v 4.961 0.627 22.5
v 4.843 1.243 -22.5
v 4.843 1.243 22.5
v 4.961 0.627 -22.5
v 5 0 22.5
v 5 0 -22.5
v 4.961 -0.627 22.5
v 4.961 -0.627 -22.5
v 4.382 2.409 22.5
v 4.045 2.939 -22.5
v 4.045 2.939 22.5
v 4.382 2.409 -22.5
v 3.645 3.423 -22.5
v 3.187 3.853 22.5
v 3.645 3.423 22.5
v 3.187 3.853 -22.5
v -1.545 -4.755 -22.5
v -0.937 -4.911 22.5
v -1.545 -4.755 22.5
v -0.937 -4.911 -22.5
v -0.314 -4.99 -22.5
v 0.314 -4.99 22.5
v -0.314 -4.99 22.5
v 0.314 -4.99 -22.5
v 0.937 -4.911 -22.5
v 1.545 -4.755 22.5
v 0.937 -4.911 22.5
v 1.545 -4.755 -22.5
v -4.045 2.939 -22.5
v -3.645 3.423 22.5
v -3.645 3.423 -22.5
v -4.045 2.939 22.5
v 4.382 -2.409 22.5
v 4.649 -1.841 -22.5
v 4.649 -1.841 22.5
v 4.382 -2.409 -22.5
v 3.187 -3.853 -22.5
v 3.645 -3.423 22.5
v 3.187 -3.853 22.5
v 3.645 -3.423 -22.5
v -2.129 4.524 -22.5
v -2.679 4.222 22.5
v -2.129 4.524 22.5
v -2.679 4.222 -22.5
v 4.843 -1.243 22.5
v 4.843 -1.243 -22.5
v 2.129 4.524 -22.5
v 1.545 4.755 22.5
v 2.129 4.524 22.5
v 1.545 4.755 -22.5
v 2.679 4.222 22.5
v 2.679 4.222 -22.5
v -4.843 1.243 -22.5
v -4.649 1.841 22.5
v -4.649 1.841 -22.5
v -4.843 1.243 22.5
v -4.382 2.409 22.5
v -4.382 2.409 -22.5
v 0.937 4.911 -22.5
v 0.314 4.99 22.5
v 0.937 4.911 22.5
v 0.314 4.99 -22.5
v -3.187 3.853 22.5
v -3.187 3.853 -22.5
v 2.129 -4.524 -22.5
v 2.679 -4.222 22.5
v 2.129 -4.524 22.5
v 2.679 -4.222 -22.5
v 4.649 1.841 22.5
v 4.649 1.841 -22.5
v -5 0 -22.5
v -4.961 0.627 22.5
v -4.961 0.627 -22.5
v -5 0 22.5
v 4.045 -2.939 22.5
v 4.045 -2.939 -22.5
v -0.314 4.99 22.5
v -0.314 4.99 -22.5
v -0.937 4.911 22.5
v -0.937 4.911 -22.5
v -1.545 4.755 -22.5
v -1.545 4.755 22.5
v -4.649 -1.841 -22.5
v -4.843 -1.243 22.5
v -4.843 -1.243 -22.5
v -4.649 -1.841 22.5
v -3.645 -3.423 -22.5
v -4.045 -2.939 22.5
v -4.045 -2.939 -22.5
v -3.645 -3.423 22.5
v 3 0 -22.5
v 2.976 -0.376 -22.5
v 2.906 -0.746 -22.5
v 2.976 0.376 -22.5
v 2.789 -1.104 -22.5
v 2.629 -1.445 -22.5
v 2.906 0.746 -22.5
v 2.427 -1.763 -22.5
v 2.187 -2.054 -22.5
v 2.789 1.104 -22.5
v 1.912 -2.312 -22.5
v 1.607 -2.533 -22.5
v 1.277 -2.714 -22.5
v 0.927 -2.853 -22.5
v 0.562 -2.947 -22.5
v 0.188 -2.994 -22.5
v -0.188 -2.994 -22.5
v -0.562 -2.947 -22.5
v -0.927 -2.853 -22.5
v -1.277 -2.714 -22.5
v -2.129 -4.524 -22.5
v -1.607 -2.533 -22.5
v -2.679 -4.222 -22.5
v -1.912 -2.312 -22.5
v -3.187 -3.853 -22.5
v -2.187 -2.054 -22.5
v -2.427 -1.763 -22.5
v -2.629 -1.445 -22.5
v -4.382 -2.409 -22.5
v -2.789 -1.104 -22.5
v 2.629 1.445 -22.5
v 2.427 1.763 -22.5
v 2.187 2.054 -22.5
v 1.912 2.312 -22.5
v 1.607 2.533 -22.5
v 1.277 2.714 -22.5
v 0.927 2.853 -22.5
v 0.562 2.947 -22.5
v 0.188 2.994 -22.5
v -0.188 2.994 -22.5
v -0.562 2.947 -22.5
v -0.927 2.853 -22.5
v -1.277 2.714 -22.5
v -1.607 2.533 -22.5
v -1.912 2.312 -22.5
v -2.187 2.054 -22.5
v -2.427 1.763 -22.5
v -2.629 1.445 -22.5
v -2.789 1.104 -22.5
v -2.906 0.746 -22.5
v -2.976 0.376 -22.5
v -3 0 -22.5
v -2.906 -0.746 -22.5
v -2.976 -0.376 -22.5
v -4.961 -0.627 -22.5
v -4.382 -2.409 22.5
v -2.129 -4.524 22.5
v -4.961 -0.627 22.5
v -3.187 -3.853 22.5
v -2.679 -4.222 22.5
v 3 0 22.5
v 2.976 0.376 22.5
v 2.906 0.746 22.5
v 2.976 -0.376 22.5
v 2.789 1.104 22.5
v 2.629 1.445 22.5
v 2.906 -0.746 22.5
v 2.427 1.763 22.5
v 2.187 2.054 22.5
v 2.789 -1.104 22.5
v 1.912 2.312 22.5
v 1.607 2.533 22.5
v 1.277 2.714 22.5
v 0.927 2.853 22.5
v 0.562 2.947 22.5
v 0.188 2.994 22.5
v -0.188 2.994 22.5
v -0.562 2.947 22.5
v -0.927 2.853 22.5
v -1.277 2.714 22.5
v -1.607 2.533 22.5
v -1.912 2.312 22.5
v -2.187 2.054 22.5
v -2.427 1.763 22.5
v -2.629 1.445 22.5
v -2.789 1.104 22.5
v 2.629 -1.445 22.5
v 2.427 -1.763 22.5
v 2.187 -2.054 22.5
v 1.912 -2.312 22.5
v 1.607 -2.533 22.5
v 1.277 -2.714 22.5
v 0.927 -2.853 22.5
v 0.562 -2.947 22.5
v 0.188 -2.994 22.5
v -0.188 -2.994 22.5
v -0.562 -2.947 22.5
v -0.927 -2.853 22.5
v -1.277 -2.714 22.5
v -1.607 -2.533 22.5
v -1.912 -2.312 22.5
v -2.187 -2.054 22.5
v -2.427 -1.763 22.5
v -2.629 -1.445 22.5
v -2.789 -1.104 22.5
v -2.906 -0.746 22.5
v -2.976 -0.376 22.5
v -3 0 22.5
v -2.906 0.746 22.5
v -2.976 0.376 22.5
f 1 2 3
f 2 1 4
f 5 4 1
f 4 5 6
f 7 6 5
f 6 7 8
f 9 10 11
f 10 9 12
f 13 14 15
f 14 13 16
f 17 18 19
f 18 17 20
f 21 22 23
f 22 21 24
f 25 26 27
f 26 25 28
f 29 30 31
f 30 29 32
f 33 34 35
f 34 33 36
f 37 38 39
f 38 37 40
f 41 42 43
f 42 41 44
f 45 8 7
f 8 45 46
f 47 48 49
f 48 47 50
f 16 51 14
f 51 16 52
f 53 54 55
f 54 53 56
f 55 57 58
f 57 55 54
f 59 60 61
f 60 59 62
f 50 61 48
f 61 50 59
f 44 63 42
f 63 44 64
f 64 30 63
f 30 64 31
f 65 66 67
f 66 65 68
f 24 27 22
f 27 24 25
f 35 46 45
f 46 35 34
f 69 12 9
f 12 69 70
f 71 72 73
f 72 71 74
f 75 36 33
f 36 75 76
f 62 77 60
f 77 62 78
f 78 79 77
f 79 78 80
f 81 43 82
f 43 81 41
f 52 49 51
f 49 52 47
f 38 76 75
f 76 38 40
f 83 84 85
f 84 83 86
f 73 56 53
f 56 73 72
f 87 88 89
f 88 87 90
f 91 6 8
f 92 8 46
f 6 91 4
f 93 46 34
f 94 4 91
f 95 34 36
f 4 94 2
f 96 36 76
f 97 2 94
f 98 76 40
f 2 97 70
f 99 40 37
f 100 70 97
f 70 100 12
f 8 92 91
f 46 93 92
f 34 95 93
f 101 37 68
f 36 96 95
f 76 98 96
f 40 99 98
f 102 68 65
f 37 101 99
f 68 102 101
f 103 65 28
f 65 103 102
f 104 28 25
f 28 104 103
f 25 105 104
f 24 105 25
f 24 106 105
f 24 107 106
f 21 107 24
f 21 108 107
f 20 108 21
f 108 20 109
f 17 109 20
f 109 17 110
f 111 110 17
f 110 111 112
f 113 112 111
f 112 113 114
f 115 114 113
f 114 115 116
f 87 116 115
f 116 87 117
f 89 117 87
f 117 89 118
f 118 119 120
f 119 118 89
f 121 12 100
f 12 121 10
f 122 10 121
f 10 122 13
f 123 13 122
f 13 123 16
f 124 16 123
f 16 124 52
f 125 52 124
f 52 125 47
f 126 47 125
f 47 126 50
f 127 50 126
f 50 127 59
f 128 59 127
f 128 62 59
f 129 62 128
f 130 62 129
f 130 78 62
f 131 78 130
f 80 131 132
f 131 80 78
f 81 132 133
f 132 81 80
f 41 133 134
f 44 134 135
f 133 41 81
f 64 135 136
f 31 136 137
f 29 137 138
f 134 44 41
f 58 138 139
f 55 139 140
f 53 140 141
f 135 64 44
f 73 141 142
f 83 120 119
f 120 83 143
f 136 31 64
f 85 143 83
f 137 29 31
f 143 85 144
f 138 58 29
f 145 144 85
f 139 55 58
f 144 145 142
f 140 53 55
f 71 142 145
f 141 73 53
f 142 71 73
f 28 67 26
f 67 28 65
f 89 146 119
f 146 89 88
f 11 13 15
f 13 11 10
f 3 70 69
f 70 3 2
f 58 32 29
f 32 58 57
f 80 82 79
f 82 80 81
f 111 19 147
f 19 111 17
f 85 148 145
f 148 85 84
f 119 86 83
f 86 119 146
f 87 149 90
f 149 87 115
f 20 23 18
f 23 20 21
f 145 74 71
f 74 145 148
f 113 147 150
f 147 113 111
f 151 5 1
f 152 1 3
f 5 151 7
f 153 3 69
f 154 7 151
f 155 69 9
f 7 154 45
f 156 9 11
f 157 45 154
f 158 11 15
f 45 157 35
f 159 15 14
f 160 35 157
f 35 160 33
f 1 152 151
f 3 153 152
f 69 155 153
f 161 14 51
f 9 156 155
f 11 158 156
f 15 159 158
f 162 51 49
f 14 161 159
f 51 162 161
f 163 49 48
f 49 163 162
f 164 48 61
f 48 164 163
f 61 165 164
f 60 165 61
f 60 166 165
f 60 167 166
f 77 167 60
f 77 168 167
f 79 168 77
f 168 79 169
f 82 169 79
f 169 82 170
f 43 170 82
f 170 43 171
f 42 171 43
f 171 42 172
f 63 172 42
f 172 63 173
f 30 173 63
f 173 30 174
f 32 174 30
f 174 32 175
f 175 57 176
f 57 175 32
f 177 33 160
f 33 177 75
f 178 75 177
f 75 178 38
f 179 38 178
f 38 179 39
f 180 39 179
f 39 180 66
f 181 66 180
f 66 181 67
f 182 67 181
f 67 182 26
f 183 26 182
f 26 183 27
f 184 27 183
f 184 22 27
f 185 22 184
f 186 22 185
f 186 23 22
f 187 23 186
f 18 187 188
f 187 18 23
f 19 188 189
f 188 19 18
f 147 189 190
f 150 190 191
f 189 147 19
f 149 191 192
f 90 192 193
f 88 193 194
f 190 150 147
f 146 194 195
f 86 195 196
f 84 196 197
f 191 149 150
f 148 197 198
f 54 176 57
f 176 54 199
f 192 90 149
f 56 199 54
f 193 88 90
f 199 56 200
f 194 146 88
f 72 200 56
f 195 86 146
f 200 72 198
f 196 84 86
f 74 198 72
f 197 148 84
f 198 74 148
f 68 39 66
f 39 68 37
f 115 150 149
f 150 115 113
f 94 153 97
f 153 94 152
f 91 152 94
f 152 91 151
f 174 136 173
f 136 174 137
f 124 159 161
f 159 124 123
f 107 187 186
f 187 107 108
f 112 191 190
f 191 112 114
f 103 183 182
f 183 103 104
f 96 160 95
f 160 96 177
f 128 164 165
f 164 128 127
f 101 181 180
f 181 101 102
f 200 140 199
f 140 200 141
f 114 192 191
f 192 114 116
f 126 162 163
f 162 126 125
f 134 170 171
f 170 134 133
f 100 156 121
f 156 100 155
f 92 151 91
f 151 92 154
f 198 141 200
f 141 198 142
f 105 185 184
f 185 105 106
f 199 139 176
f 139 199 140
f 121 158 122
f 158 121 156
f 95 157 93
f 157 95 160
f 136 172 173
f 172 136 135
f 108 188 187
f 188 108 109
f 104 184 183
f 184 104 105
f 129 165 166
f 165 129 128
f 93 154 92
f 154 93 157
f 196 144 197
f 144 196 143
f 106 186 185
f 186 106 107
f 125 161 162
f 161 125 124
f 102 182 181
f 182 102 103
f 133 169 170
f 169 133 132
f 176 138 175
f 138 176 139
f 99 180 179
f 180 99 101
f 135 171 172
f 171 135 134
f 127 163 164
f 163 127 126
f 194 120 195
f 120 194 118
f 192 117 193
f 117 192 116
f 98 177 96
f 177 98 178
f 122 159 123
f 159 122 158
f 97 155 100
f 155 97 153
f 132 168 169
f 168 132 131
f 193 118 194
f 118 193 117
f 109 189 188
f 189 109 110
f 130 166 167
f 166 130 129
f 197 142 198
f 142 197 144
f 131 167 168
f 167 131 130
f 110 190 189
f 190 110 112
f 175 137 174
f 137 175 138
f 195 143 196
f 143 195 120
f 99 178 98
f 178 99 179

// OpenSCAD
$fn = 50;


difference() {
	union() {
		translate(v = [0, 0, -22.5000000000]) {
			cylinder(h = 45, r = 5.0000000000);
		}
	}
	union() {
		translate(v = [0, 0, -100.0000000000]) {
			cylinder(h = 200, r = 3.0000000000);
		}
	}
}
